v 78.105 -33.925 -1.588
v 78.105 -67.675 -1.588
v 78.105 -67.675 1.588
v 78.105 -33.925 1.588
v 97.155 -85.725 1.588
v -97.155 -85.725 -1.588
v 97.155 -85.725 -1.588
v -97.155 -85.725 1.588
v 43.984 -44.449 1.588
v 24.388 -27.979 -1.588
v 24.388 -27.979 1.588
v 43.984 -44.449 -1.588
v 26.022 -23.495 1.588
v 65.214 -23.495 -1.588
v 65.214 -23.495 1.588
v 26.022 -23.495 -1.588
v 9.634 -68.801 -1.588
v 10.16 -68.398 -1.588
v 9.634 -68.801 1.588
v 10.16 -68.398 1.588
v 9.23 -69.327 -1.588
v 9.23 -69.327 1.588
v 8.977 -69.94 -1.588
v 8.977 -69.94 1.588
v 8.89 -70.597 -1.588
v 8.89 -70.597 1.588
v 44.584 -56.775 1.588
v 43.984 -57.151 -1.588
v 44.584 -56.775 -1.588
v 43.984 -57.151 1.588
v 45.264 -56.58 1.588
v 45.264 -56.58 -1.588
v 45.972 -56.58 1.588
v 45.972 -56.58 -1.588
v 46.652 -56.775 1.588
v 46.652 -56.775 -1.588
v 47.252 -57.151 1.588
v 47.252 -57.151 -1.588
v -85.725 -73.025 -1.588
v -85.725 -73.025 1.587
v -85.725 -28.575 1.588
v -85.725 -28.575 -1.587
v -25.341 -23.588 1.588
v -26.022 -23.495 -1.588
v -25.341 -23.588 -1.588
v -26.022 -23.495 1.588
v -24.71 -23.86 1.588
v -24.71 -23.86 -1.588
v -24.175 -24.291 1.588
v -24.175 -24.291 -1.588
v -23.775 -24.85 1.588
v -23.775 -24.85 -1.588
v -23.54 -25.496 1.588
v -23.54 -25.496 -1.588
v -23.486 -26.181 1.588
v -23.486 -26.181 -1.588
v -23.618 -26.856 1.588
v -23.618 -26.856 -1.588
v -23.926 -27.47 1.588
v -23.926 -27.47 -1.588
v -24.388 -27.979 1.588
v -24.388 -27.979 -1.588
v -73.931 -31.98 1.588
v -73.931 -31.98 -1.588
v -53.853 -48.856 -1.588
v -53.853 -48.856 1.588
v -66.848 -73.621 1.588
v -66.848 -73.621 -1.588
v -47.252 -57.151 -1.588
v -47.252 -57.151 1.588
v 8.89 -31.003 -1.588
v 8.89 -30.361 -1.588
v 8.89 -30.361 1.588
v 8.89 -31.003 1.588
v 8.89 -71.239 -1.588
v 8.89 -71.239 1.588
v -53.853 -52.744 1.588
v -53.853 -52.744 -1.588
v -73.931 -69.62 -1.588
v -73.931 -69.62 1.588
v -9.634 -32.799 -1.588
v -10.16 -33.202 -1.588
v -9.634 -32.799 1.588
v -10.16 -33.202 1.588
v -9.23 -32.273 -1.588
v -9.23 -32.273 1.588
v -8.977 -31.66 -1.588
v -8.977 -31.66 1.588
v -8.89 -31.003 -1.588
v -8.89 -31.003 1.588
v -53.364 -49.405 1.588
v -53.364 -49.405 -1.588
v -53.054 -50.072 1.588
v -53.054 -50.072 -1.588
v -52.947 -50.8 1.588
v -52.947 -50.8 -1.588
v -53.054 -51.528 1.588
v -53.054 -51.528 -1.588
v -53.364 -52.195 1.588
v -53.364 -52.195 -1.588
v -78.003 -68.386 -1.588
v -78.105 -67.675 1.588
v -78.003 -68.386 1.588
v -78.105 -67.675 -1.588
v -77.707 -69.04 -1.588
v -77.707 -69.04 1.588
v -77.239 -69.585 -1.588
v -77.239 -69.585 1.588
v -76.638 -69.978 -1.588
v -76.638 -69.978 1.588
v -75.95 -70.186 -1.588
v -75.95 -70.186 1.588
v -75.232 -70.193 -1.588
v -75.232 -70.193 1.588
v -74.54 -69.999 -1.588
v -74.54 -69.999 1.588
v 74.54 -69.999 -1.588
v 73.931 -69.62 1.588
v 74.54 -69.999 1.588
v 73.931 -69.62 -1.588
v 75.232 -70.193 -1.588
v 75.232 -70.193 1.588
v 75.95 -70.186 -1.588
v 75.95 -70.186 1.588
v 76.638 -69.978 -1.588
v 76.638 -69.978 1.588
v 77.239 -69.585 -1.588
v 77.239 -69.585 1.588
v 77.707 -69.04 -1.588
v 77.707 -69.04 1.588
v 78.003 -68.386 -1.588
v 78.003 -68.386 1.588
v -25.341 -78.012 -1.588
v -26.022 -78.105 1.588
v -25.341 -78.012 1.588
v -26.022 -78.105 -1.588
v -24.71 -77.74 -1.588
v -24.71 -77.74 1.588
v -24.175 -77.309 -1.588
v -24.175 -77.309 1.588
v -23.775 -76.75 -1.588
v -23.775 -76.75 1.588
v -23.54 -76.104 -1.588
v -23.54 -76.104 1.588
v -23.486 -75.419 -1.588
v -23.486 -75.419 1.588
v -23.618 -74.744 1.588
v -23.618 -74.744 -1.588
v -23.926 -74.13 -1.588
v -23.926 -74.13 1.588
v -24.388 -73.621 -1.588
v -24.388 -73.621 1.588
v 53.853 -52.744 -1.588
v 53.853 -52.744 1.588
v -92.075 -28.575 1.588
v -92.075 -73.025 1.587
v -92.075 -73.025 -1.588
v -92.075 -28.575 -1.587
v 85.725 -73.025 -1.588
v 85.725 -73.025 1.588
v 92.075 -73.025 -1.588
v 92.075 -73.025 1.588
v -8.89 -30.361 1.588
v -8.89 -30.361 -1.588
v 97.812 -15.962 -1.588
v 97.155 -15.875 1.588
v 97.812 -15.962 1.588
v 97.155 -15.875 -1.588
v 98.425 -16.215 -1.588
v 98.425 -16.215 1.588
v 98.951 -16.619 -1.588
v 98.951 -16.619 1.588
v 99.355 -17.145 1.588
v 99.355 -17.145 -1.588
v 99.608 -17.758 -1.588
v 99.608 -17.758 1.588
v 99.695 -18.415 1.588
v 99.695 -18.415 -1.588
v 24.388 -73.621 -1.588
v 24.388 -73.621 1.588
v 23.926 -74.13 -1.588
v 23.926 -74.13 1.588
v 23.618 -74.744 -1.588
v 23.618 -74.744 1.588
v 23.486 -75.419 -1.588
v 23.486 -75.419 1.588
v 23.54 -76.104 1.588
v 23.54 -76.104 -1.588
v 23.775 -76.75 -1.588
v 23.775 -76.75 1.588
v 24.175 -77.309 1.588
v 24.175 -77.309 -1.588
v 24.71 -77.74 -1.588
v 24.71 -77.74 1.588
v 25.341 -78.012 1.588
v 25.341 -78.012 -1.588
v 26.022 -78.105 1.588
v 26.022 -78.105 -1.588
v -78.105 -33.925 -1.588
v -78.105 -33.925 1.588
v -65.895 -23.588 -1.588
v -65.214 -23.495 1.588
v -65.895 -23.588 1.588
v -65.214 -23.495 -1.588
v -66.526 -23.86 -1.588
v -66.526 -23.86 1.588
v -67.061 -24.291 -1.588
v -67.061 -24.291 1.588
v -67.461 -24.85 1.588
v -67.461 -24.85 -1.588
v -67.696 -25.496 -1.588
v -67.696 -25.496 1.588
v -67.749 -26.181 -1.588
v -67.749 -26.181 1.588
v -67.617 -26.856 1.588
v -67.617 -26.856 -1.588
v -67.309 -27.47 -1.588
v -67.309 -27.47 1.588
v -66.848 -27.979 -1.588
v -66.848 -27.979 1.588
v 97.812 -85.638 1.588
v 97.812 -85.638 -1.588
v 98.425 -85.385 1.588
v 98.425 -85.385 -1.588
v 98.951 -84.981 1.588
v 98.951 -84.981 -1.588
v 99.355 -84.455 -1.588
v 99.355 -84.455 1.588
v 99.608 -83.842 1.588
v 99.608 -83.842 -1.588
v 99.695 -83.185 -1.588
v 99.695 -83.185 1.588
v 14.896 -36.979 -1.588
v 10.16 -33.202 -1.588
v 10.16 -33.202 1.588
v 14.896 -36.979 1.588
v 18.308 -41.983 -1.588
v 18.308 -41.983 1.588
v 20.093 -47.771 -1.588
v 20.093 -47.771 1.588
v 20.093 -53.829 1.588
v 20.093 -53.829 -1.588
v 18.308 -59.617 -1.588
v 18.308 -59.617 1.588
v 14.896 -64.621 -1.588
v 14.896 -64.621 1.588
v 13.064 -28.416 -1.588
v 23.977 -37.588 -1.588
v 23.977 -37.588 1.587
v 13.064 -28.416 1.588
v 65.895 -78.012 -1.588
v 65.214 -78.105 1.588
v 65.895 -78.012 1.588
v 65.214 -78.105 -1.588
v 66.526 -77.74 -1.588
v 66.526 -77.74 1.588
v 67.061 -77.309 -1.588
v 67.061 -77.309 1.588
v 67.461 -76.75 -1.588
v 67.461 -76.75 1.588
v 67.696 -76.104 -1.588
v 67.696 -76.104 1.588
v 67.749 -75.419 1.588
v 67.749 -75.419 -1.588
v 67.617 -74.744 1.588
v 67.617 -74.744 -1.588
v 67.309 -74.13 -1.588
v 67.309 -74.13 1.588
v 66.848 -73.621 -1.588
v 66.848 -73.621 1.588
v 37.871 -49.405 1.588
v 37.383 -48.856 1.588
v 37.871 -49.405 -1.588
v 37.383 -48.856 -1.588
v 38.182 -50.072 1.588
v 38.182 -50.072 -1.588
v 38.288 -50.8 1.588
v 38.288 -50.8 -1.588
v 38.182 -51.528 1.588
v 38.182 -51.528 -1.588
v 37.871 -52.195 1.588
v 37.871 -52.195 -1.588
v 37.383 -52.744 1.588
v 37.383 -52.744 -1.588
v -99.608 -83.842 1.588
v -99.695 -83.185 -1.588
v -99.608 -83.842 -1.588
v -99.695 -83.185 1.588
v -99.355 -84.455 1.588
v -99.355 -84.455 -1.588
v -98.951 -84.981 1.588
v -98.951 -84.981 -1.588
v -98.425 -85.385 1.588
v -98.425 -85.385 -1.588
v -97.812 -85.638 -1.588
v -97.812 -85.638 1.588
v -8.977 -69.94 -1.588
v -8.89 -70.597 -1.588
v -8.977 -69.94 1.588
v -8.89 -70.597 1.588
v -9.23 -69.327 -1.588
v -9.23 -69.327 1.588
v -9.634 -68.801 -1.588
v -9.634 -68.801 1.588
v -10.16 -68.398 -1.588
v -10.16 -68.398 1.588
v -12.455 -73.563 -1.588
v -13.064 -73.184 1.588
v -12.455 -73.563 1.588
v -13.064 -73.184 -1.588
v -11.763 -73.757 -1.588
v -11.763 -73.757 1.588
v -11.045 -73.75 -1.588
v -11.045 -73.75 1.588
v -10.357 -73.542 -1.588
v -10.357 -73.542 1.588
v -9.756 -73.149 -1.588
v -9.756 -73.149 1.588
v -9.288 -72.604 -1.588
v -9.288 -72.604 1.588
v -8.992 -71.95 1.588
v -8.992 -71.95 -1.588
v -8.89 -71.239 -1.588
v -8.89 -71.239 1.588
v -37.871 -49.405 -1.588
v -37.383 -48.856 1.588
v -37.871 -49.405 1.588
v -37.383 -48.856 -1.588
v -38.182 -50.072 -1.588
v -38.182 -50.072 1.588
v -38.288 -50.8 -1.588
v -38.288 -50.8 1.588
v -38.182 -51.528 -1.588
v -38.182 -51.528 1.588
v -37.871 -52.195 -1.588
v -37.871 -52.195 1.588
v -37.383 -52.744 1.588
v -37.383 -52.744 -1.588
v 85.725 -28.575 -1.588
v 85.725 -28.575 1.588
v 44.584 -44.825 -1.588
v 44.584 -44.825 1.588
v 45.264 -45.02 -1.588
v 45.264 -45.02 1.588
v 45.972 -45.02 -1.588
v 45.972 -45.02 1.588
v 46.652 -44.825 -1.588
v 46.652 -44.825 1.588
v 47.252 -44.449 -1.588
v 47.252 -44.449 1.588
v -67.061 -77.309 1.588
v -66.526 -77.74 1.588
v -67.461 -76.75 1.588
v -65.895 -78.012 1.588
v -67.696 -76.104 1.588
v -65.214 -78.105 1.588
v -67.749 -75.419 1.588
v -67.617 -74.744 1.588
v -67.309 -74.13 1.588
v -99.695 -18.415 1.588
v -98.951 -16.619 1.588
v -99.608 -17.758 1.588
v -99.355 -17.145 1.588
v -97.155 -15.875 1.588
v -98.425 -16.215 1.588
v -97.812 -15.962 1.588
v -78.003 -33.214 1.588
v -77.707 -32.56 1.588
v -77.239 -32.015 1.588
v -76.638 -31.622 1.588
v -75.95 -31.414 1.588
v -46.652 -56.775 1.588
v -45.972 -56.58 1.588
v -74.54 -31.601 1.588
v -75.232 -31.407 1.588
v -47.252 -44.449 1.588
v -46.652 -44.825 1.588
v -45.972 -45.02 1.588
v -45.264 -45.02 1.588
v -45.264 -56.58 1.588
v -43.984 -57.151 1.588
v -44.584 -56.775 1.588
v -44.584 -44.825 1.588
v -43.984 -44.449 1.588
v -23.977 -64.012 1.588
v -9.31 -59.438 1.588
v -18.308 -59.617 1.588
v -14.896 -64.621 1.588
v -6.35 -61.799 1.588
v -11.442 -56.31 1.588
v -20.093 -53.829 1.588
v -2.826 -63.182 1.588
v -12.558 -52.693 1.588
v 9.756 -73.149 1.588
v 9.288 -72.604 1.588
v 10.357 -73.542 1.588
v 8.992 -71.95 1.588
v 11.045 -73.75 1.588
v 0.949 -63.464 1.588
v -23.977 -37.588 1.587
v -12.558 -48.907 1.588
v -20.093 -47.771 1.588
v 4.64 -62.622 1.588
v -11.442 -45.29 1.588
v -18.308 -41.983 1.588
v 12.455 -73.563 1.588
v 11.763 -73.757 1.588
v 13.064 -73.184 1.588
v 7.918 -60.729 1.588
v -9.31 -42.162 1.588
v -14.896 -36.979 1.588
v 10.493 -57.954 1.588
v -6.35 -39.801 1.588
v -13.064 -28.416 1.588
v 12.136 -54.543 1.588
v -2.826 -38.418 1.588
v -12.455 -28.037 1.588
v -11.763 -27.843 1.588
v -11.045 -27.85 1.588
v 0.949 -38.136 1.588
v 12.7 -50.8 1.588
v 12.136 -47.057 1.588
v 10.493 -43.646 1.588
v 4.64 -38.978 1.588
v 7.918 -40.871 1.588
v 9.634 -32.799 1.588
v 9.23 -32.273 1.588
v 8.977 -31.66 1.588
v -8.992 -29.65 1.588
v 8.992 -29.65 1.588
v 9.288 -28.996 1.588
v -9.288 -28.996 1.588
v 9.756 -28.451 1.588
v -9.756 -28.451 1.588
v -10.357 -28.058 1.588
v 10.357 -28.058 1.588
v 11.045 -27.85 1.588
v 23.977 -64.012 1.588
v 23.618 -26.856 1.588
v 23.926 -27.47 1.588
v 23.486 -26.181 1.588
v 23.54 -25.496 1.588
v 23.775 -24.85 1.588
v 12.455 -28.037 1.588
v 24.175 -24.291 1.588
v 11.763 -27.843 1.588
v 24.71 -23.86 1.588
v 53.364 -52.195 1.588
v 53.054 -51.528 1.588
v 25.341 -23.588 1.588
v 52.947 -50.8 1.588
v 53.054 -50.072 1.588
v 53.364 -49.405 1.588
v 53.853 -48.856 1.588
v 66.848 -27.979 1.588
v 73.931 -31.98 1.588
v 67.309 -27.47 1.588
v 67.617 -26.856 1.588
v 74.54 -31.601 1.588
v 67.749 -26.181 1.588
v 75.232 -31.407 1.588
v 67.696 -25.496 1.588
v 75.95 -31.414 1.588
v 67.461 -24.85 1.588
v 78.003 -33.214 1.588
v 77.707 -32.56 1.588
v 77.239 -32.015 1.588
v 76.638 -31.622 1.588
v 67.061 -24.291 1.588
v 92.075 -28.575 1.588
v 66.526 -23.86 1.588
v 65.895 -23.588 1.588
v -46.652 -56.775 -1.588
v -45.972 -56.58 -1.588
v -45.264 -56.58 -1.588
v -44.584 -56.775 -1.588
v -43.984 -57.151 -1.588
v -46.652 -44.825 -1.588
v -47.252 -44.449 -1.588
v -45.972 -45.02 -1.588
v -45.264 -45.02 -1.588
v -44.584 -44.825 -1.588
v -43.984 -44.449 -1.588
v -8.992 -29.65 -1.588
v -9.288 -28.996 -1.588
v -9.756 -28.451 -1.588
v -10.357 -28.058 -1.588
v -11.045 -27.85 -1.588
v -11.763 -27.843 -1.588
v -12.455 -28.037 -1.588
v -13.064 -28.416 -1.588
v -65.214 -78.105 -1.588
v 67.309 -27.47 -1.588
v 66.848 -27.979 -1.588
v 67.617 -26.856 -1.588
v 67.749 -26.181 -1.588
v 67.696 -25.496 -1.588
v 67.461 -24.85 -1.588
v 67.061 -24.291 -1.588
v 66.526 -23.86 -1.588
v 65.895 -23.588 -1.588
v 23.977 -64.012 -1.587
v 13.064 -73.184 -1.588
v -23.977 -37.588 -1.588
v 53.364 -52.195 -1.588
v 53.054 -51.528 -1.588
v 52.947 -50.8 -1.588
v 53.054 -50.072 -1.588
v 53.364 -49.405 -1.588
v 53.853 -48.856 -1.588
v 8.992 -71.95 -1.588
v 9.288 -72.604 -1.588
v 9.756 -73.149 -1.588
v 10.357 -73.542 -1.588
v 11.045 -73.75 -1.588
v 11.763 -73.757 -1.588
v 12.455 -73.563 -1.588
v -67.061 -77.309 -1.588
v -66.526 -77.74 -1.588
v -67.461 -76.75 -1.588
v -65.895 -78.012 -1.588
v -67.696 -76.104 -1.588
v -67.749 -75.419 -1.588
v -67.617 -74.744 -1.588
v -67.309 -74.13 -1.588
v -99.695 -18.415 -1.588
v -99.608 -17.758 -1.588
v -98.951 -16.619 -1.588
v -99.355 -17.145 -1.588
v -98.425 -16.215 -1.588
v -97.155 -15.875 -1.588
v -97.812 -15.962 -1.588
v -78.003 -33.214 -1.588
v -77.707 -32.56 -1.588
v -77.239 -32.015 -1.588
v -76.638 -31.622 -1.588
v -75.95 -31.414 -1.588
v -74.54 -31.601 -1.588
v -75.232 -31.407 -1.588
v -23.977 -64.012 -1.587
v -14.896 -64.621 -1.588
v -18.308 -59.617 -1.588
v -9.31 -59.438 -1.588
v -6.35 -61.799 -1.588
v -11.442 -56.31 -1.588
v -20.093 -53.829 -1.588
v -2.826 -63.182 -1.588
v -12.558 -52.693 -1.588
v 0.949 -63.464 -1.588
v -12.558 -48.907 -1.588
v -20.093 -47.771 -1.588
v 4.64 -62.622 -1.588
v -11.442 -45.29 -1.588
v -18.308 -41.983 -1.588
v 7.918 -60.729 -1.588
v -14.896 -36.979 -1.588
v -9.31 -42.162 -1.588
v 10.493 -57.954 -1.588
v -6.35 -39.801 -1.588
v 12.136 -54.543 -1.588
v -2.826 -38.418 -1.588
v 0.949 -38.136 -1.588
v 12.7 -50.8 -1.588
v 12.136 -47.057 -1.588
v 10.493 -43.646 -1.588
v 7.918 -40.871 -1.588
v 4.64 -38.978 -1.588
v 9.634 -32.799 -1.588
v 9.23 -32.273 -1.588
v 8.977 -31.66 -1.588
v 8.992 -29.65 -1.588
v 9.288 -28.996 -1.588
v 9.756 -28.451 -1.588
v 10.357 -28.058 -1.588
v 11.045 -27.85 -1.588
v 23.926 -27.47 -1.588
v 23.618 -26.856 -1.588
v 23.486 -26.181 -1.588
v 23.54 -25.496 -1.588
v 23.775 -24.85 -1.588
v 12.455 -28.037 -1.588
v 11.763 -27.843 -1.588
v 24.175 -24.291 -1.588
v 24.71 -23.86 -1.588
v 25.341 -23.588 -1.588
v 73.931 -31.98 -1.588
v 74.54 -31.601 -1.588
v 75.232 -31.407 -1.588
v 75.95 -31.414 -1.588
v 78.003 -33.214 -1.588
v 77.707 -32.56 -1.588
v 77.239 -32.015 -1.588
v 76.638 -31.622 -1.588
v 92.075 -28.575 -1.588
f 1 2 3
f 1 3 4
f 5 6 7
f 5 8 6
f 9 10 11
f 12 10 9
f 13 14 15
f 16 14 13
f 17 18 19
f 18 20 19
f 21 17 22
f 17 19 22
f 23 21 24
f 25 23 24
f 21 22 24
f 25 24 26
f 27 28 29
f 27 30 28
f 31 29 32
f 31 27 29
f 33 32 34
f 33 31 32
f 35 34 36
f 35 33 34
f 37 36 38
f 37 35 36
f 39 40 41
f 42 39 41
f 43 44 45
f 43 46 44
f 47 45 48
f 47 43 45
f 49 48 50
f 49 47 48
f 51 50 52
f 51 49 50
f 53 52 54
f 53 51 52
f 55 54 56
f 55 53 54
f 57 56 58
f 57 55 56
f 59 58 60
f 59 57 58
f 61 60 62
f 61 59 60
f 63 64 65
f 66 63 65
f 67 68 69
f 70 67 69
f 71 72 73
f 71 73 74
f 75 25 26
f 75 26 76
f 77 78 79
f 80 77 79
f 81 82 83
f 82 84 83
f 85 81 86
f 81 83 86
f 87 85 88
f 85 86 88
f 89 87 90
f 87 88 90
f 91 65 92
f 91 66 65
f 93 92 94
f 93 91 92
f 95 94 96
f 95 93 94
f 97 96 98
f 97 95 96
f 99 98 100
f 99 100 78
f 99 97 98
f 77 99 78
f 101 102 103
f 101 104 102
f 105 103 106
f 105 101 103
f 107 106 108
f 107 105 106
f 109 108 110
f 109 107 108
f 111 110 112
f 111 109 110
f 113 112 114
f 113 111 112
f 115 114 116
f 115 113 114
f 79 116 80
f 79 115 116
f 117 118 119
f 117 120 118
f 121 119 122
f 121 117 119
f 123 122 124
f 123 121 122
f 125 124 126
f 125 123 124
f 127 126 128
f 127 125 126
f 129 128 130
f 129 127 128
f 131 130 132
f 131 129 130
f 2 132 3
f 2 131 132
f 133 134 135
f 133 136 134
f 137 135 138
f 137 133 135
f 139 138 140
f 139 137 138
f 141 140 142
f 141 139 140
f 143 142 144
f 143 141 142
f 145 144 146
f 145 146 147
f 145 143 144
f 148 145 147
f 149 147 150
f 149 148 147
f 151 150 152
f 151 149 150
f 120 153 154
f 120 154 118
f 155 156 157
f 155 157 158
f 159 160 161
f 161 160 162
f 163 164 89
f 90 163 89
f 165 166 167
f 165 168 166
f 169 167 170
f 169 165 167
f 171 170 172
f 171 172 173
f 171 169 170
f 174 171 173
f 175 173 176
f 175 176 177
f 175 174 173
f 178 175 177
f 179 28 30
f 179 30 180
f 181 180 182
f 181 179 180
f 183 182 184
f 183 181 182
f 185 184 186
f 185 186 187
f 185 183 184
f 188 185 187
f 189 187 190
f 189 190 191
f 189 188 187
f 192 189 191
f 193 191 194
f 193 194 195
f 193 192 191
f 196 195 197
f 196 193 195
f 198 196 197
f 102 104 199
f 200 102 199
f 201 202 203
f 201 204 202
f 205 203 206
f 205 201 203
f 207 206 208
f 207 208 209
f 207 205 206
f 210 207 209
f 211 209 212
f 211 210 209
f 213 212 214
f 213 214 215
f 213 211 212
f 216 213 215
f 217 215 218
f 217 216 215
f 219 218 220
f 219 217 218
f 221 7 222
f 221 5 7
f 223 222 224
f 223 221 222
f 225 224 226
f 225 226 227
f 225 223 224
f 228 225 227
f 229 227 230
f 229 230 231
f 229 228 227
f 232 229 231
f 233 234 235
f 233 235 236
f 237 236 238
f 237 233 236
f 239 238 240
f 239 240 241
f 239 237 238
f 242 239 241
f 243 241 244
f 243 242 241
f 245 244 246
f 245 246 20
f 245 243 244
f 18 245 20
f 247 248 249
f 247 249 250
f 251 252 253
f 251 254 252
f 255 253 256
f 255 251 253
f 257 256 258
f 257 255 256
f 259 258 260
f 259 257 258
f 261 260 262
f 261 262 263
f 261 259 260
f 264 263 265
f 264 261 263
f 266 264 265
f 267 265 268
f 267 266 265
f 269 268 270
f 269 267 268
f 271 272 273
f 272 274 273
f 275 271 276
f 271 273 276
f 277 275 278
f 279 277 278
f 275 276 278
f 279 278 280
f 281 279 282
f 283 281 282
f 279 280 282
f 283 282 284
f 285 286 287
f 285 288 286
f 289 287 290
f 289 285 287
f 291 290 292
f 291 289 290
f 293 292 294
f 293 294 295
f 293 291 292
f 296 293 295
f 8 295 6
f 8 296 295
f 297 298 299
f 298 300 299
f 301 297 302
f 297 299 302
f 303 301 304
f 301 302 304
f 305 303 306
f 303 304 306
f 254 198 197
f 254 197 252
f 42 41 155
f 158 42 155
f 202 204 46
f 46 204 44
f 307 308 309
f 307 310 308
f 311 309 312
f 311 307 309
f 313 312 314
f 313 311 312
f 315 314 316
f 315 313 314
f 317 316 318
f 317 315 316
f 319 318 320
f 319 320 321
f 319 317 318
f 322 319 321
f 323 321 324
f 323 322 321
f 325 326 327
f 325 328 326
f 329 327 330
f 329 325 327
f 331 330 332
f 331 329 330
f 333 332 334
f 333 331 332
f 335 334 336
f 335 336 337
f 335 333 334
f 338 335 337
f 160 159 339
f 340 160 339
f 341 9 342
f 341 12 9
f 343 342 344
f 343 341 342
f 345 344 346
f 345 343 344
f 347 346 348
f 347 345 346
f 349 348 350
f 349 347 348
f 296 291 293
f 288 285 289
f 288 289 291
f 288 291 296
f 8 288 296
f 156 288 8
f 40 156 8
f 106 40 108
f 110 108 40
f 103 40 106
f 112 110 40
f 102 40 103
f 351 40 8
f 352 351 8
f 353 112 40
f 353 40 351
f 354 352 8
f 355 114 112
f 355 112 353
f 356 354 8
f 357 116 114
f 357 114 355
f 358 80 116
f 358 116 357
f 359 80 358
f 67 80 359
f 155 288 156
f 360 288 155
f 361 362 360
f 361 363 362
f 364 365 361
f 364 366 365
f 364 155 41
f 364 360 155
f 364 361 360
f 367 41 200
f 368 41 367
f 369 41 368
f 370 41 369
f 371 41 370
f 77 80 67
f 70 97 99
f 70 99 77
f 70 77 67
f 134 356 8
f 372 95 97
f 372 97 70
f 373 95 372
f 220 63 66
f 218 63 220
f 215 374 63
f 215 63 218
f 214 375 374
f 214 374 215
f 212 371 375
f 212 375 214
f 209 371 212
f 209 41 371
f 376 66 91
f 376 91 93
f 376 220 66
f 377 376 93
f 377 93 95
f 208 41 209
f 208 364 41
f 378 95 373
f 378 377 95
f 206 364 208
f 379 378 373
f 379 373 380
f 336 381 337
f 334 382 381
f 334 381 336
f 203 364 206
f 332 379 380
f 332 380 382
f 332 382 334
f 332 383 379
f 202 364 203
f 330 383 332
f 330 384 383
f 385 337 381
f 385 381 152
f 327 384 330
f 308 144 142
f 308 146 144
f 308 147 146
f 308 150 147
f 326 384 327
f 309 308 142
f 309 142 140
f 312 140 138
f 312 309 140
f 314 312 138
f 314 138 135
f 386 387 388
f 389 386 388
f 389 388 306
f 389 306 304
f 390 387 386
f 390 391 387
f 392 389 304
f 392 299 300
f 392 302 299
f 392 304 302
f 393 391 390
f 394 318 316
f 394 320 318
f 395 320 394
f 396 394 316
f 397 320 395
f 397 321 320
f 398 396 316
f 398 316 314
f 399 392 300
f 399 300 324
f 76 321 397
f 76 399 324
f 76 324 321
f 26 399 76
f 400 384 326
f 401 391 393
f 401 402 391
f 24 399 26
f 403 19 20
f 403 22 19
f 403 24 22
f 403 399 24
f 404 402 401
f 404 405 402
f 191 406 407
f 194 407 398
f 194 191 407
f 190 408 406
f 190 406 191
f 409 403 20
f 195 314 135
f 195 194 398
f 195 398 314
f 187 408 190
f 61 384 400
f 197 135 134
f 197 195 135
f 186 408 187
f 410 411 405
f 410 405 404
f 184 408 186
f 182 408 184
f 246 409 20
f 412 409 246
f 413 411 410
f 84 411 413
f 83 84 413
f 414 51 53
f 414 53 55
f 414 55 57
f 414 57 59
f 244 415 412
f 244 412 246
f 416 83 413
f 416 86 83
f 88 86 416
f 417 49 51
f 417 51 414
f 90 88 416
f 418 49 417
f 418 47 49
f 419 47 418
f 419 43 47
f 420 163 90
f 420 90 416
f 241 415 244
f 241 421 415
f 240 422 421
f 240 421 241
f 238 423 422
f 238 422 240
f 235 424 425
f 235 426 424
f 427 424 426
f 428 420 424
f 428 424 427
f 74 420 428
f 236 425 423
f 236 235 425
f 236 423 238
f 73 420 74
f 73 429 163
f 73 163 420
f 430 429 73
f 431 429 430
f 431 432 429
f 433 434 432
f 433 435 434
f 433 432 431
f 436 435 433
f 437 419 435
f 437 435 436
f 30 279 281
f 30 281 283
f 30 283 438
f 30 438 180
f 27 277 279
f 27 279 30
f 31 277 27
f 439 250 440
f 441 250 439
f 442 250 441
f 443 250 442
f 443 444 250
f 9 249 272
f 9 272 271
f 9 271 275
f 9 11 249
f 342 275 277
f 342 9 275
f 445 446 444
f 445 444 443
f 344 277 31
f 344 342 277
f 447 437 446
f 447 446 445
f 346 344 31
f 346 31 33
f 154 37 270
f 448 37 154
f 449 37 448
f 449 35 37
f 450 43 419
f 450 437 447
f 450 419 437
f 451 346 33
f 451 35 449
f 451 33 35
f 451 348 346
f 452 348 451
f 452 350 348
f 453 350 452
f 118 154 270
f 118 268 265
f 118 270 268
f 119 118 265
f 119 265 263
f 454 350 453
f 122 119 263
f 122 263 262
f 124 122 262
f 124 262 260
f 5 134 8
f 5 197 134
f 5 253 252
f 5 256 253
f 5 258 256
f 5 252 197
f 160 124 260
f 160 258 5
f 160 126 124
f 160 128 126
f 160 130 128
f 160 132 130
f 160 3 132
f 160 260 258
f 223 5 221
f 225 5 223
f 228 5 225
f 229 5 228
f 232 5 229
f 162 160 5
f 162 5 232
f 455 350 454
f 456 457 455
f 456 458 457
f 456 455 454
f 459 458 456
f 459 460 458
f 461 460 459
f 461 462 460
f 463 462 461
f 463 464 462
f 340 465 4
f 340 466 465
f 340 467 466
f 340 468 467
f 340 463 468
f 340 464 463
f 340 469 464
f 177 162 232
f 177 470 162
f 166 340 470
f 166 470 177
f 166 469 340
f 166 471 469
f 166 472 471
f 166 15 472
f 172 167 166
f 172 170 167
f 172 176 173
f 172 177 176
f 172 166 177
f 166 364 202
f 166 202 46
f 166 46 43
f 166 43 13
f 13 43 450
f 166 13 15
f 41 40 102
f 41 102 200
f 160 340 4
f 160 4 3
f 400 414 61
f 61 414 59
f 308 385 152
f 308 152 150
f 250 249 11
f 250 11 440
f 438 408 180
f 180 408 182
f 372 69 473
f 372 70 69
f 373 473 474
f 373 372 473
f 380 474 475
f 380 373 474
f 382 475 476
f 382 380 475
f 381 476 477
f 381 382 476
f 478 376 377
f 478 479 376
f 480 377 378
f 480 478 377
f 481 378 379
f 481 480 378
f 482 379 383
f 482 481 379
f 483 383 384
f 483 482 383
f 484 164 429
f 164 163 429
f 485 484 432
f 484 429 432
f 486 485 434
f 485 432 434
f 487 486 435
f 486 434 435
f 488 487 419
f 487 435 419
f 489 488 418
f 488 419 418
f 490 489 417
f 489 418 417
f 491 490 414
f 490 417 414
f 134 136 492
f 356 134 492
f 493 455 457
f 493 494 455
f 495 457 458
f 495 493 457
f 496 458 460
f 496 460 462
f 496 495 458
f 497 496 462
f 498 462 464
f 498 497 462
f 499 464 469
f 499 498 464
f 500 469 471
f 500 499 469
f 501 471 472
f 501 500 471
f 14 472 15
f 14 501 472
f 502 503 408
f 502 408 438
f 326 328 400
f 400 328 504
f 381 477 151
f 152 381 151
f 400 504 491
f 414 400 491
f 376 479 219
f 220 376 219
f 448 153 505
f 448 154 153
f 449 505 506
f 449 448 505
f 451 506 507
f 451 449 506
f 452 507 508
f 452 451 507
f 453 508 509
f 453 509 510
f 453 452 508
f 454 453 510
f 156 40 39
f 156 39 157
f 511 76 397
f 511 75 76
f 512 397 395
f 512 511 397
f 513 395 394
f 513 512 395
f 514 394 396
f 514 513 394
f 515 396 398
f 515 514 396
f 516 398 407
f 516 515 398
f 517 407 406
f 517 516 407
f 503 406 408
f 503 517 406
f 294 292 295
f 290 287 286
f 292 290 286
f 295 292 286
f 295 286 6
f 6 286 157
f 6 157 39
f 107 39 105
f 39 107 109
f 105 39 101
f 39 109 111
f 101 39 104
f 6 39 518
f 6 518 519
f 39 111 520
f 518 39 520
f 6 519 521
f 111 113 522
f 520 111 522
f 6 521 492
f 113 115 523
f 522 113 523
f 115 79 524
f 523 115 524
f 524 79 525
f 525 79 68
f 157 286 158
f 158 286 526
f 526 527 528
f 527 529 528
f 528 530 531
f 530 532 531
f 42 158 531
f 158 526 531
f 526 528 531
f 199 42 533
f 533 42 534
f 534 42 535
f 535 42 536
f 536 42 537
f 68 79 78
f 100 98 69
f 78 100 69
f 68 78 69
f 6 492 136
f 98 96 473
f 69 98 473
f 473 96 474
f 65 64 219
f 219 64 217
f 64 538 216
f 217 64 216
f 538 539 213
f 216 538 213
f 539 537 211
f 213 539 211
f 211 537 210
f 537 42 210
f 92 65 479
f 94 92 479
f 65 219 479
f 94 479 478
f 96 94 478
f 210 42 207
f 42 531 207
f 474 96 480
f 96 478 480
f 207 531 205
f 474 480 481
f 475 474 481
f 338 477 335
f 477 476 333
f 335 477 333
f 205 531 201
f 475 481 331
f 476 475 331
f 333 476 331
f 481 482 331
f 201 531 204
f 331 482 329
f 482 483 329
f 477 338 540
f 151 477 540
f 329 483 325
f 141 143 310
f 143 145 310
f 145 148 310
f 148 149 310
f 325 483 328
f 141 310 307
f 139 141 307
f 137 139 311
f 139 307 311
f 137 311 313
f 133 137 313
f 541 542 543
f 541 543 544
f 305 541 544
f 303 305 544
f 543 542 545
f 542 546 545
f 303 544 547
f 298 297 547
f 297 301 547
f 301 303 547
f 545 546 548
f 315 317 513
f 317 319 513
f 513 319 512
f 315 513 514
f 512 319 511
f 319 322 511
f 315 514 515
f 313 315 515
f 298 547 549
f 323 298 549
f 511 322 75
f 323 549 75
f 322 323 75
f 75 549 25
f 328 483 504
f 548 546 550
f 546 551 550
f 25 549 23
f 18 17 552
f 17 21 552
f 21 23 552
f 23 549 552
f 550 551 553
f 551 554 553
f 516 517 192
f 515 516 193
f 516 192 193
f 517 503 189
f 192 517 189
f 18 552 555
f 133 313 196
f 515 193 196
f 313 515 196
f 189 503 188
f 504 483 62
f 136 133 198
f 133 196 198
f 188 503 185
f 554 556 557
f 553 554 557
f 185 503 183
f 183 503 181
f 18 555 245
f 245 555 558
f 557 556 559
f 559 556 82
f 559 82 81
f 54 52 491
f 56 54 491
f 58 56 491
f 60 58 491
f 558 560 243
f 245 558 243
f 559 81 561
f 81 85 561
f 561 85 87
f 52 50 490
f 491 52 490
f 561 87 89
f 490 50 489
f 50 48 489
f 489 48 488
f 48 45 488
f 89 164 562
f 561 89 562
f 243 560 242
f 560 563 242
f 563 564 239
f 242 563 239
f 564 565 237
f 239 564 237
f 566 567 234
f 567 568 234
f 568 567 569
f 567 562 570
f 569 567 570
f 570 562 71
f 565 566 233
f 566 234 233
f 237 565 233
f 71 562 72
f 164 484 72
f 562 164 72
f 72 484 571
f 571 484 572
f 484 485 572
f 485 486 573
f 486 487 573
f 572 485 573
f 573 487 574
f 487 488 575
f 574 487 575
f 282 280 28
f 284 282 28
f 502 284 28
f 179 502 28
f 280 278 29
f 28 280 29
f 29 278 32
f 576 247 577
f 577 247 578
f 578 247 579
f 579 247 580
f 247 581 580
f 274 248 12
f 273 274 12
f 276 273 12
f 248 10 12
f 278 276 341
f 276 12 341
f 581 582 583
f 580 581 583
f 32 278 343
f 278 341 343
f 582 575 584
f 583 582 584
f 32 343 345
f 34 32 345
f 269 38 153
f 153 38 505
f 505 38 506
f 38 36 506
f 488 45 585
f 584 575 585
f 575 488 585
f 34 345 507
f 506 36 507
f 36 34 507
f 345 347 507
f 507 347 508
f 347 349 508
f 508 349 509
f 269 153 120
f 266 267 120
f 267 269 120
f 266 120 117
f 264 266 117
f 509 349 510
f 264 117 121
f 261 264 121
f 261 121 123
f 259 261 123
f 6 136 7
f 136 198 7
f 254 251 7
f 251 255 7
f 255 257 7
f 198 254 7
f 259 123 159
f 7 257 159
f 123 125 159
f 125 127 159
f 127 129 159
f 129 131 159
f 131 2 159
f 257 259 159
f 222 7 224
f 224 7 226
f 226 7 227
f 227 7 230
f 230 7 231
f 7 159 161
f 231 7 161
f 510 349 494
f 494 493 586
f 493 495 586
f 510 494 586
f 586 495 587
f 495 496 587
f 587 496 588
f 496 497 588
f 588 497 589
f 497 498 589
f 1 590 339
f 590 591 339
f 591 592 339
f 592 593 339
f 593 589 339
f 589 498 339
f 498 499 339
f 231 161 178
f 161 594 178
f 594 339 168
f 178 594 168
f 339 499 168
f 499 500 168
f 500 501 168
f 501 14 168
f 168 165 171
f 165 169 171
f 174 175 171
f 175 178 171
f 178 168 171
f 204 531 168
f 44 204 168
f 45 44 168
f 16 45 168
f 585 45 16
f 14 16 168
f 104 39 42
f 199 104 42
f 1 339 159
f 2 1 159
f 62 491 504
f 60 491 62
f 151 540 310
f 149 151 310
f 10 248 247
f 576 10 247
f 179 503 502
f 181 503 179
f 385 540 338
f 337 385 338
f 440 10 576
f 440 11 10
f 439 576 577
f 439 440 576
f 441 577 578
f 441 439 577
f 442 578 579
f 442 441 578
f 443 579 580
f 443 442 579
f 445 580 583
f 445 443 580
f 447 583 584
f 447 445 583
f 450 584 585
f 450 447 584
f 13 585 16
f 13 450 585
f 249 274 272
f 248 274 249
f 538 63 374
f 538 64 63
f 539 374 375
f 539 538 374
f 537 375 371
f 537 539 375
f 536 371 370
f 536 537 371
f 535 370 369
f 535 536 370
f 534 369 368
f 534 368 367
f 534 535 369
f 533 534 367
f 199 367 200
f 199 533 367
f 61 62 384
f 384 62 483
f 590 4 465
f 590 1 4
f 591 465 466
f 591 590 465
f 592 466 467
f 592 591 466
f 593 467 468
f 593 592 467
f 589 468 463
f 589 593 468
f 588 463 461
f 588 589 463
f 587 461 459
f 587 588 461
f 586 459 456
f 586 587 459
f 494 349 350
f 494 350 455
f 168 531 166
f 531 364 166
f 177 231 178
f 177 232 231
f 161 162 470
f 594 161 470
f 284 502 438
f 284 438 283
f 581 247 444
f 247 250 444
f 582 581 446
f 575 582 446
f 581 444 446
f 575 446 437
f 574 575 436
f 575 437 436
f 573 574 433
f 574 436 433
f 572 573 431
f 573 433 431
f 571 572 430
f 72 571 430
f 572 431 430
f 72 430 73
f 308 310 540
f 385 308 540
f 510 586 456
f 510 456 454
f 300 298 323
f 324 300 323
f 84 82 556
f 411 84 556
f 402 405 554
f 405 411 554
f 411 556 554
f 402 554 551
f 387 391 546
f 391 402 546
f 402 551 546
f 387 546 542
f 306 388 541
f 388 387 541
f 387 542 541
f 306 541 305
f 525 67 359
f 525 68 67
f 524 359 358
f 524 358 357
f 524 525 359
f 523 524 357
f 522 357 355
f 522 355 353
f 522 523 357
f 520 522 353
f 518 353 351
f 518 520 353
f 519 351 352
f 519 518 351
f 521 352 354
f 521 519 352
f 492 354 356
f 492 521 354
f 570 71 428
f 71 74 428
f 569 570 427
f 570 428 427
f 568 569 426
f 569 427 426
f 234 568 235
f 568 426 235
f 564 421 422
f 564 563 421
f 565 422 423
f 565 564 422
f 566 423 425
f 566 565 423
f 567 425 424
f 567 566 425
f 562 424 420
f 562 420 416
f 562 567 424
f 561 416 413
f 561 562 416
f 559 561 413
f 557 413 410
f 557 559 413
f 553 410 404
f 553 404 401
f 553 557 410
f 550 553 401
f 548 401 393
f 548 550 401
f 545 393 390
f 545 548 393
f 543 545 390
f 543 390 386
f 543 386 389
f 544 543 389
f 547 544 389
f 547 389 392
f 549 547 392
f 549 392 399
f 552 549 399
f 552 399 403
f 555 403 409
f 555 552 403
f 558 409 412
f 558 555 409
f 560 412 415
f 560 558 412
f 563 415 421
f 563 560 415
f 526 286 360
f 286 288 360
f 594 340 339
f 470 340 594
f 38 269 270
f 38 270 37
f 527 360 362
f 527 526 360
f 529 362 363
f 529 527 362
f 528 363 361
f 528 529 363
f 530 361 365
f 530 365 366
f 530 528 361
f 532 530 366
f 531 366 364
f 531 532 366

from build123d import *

# Parameters (mm, degrees)
SKETCH1_W           = 199.39
SKETCH1_H           = 69.85
SKETCH1_R           = 12.7
SKETCH1_W_2         = 6.35
SKETCH1_H_2         = 44.45
BOSS_EXTRUDE1_DEPTH = 1.5875
SKETCH1_3_W         = 6.35
SKETCH1_3_H         = 44.45
CUT_EXTRUDE1_DEPTH  = 3.175
FILLET1_R           = 2.54


with BuildPart() as part:
    # Sketch1 → Boss-Extrude1 (new, symmetric)
    with BuildSketch(Plane.XY):
        with Locations((0, -50.8)):
            Rectangle(SKETCH1_W, SKETCH1_H)
        with Locations((0, -50.8)):
            Circle(SKETCH1_R, mode=Mode.SUBTRACT)
        with Locations((88.9, -50.8)):
            Rectangle(SKETCH1_W_2, SKETCH1_H_2, mode=Mode.SUBTRACT)
    extrude(amount=BOSS_EXTRUDE1_DEPTH, both=True)

    # Sketch1<3> → Cut-Extrude1 (cut, symmetric)
    with BuildSketch(Plane.XY):
        with Locations((88.9, -50.8)):
            Rectangle(SKETCH1_3_W, SKETCH1_3_H)
        with BuildLine():
            Line((8.89, -24.907881896), (8.89, -32.527881896))
            ThreePointArc((8.89, -32.527881896), (20.32, -50.8), (8.89, -69.072118104))
            Line((8.89, -69.072118104), (8.89, -76.692118104))
            Line((8.89, -76.692118104), (39.696193404, -50.8))
            Line((39.696193404, -50.8), (8.89, -24.907881896))
        make_face()
        Polygon((72.183420116, -23.495), (19.052126459, -23.495), (45.617773288, -45.823005806), align=None)
        Polygon((72.183420116, -78.105), (45.617773288, -55.776994194), (19.052126459, -78.105), align=None)
        Polygon((78.105, -28.471994194), (51.539353171, -50.8), (78.105, -73.128005806), align=None)
    cut_extrude1 = extrude(amount=CUT_EXTRUDE1_DEPTH, both=True, mode=Mode.SUBTRACT)

    # Mirror1: Cut-Extrude1 across plane
    add(cut_extrude1.mirror(Plane(origin=(0, 0, 0), x_dir=(0, 0, 1), z_dir=(1, 0, 0))), mode=Mode.SUBTRACT)

    # Fillet1
    fillet1_edges = [part.edges().sort_by_distance(p)[0] for p in [
        (51.539353171, -50.8, 0),
        (78.105, -28.471994194, 0),
        (78.105, -73.128005806, 0),
        (39.696193404, -50.8, 0),
        (72.183420116, -78.105, 0),
        (19.052126459, -78.105, 0),
        (45.617773288, -55.776994194, 0),
        (19.052126459, -23.495, 0),
        (72.183420116, -23.495, 0),
        (45.617773288, -45.823005806, 0),
        (99.695, -85.725, 0),
        (99.695, -15.875, 0),
        (-99.695, -85.725, 0),
        (-99.695, -15.875, 0),
        (-78.105, -28.471994194, 0),
        (-51.539353171, -50.8, 0),
        (-78.105, -73.128005806, 0),
        (-39.696193404, -50.8, 0),
        (-72.183420116, -78.105, 0),
        (-45.617773288, -55.776994194, 0),
        (-19.052126459, -78.105, 0),
        (-72.183420116, -23.495, 0),
        (-45.617773288, -45.823005806, 0),
        (-19.052126459, -23.495, 0),
        (-8.89, -32.527881896, 0),
        (-8.89, -76.692118104, 0),
        (-8.89, -24.907881896, 0),
        (-8.89, -69.072118104, 0),
        (8.89, -76.692118104, 0),
        (8.89, -69.072118104, 0),
        (8.89, -32.527881896, 0),
        (8.89, -24.907881896, 0),
    ]]
    fillet(fillet1_edges, radius=FILLET1_R)


solid = part.part
